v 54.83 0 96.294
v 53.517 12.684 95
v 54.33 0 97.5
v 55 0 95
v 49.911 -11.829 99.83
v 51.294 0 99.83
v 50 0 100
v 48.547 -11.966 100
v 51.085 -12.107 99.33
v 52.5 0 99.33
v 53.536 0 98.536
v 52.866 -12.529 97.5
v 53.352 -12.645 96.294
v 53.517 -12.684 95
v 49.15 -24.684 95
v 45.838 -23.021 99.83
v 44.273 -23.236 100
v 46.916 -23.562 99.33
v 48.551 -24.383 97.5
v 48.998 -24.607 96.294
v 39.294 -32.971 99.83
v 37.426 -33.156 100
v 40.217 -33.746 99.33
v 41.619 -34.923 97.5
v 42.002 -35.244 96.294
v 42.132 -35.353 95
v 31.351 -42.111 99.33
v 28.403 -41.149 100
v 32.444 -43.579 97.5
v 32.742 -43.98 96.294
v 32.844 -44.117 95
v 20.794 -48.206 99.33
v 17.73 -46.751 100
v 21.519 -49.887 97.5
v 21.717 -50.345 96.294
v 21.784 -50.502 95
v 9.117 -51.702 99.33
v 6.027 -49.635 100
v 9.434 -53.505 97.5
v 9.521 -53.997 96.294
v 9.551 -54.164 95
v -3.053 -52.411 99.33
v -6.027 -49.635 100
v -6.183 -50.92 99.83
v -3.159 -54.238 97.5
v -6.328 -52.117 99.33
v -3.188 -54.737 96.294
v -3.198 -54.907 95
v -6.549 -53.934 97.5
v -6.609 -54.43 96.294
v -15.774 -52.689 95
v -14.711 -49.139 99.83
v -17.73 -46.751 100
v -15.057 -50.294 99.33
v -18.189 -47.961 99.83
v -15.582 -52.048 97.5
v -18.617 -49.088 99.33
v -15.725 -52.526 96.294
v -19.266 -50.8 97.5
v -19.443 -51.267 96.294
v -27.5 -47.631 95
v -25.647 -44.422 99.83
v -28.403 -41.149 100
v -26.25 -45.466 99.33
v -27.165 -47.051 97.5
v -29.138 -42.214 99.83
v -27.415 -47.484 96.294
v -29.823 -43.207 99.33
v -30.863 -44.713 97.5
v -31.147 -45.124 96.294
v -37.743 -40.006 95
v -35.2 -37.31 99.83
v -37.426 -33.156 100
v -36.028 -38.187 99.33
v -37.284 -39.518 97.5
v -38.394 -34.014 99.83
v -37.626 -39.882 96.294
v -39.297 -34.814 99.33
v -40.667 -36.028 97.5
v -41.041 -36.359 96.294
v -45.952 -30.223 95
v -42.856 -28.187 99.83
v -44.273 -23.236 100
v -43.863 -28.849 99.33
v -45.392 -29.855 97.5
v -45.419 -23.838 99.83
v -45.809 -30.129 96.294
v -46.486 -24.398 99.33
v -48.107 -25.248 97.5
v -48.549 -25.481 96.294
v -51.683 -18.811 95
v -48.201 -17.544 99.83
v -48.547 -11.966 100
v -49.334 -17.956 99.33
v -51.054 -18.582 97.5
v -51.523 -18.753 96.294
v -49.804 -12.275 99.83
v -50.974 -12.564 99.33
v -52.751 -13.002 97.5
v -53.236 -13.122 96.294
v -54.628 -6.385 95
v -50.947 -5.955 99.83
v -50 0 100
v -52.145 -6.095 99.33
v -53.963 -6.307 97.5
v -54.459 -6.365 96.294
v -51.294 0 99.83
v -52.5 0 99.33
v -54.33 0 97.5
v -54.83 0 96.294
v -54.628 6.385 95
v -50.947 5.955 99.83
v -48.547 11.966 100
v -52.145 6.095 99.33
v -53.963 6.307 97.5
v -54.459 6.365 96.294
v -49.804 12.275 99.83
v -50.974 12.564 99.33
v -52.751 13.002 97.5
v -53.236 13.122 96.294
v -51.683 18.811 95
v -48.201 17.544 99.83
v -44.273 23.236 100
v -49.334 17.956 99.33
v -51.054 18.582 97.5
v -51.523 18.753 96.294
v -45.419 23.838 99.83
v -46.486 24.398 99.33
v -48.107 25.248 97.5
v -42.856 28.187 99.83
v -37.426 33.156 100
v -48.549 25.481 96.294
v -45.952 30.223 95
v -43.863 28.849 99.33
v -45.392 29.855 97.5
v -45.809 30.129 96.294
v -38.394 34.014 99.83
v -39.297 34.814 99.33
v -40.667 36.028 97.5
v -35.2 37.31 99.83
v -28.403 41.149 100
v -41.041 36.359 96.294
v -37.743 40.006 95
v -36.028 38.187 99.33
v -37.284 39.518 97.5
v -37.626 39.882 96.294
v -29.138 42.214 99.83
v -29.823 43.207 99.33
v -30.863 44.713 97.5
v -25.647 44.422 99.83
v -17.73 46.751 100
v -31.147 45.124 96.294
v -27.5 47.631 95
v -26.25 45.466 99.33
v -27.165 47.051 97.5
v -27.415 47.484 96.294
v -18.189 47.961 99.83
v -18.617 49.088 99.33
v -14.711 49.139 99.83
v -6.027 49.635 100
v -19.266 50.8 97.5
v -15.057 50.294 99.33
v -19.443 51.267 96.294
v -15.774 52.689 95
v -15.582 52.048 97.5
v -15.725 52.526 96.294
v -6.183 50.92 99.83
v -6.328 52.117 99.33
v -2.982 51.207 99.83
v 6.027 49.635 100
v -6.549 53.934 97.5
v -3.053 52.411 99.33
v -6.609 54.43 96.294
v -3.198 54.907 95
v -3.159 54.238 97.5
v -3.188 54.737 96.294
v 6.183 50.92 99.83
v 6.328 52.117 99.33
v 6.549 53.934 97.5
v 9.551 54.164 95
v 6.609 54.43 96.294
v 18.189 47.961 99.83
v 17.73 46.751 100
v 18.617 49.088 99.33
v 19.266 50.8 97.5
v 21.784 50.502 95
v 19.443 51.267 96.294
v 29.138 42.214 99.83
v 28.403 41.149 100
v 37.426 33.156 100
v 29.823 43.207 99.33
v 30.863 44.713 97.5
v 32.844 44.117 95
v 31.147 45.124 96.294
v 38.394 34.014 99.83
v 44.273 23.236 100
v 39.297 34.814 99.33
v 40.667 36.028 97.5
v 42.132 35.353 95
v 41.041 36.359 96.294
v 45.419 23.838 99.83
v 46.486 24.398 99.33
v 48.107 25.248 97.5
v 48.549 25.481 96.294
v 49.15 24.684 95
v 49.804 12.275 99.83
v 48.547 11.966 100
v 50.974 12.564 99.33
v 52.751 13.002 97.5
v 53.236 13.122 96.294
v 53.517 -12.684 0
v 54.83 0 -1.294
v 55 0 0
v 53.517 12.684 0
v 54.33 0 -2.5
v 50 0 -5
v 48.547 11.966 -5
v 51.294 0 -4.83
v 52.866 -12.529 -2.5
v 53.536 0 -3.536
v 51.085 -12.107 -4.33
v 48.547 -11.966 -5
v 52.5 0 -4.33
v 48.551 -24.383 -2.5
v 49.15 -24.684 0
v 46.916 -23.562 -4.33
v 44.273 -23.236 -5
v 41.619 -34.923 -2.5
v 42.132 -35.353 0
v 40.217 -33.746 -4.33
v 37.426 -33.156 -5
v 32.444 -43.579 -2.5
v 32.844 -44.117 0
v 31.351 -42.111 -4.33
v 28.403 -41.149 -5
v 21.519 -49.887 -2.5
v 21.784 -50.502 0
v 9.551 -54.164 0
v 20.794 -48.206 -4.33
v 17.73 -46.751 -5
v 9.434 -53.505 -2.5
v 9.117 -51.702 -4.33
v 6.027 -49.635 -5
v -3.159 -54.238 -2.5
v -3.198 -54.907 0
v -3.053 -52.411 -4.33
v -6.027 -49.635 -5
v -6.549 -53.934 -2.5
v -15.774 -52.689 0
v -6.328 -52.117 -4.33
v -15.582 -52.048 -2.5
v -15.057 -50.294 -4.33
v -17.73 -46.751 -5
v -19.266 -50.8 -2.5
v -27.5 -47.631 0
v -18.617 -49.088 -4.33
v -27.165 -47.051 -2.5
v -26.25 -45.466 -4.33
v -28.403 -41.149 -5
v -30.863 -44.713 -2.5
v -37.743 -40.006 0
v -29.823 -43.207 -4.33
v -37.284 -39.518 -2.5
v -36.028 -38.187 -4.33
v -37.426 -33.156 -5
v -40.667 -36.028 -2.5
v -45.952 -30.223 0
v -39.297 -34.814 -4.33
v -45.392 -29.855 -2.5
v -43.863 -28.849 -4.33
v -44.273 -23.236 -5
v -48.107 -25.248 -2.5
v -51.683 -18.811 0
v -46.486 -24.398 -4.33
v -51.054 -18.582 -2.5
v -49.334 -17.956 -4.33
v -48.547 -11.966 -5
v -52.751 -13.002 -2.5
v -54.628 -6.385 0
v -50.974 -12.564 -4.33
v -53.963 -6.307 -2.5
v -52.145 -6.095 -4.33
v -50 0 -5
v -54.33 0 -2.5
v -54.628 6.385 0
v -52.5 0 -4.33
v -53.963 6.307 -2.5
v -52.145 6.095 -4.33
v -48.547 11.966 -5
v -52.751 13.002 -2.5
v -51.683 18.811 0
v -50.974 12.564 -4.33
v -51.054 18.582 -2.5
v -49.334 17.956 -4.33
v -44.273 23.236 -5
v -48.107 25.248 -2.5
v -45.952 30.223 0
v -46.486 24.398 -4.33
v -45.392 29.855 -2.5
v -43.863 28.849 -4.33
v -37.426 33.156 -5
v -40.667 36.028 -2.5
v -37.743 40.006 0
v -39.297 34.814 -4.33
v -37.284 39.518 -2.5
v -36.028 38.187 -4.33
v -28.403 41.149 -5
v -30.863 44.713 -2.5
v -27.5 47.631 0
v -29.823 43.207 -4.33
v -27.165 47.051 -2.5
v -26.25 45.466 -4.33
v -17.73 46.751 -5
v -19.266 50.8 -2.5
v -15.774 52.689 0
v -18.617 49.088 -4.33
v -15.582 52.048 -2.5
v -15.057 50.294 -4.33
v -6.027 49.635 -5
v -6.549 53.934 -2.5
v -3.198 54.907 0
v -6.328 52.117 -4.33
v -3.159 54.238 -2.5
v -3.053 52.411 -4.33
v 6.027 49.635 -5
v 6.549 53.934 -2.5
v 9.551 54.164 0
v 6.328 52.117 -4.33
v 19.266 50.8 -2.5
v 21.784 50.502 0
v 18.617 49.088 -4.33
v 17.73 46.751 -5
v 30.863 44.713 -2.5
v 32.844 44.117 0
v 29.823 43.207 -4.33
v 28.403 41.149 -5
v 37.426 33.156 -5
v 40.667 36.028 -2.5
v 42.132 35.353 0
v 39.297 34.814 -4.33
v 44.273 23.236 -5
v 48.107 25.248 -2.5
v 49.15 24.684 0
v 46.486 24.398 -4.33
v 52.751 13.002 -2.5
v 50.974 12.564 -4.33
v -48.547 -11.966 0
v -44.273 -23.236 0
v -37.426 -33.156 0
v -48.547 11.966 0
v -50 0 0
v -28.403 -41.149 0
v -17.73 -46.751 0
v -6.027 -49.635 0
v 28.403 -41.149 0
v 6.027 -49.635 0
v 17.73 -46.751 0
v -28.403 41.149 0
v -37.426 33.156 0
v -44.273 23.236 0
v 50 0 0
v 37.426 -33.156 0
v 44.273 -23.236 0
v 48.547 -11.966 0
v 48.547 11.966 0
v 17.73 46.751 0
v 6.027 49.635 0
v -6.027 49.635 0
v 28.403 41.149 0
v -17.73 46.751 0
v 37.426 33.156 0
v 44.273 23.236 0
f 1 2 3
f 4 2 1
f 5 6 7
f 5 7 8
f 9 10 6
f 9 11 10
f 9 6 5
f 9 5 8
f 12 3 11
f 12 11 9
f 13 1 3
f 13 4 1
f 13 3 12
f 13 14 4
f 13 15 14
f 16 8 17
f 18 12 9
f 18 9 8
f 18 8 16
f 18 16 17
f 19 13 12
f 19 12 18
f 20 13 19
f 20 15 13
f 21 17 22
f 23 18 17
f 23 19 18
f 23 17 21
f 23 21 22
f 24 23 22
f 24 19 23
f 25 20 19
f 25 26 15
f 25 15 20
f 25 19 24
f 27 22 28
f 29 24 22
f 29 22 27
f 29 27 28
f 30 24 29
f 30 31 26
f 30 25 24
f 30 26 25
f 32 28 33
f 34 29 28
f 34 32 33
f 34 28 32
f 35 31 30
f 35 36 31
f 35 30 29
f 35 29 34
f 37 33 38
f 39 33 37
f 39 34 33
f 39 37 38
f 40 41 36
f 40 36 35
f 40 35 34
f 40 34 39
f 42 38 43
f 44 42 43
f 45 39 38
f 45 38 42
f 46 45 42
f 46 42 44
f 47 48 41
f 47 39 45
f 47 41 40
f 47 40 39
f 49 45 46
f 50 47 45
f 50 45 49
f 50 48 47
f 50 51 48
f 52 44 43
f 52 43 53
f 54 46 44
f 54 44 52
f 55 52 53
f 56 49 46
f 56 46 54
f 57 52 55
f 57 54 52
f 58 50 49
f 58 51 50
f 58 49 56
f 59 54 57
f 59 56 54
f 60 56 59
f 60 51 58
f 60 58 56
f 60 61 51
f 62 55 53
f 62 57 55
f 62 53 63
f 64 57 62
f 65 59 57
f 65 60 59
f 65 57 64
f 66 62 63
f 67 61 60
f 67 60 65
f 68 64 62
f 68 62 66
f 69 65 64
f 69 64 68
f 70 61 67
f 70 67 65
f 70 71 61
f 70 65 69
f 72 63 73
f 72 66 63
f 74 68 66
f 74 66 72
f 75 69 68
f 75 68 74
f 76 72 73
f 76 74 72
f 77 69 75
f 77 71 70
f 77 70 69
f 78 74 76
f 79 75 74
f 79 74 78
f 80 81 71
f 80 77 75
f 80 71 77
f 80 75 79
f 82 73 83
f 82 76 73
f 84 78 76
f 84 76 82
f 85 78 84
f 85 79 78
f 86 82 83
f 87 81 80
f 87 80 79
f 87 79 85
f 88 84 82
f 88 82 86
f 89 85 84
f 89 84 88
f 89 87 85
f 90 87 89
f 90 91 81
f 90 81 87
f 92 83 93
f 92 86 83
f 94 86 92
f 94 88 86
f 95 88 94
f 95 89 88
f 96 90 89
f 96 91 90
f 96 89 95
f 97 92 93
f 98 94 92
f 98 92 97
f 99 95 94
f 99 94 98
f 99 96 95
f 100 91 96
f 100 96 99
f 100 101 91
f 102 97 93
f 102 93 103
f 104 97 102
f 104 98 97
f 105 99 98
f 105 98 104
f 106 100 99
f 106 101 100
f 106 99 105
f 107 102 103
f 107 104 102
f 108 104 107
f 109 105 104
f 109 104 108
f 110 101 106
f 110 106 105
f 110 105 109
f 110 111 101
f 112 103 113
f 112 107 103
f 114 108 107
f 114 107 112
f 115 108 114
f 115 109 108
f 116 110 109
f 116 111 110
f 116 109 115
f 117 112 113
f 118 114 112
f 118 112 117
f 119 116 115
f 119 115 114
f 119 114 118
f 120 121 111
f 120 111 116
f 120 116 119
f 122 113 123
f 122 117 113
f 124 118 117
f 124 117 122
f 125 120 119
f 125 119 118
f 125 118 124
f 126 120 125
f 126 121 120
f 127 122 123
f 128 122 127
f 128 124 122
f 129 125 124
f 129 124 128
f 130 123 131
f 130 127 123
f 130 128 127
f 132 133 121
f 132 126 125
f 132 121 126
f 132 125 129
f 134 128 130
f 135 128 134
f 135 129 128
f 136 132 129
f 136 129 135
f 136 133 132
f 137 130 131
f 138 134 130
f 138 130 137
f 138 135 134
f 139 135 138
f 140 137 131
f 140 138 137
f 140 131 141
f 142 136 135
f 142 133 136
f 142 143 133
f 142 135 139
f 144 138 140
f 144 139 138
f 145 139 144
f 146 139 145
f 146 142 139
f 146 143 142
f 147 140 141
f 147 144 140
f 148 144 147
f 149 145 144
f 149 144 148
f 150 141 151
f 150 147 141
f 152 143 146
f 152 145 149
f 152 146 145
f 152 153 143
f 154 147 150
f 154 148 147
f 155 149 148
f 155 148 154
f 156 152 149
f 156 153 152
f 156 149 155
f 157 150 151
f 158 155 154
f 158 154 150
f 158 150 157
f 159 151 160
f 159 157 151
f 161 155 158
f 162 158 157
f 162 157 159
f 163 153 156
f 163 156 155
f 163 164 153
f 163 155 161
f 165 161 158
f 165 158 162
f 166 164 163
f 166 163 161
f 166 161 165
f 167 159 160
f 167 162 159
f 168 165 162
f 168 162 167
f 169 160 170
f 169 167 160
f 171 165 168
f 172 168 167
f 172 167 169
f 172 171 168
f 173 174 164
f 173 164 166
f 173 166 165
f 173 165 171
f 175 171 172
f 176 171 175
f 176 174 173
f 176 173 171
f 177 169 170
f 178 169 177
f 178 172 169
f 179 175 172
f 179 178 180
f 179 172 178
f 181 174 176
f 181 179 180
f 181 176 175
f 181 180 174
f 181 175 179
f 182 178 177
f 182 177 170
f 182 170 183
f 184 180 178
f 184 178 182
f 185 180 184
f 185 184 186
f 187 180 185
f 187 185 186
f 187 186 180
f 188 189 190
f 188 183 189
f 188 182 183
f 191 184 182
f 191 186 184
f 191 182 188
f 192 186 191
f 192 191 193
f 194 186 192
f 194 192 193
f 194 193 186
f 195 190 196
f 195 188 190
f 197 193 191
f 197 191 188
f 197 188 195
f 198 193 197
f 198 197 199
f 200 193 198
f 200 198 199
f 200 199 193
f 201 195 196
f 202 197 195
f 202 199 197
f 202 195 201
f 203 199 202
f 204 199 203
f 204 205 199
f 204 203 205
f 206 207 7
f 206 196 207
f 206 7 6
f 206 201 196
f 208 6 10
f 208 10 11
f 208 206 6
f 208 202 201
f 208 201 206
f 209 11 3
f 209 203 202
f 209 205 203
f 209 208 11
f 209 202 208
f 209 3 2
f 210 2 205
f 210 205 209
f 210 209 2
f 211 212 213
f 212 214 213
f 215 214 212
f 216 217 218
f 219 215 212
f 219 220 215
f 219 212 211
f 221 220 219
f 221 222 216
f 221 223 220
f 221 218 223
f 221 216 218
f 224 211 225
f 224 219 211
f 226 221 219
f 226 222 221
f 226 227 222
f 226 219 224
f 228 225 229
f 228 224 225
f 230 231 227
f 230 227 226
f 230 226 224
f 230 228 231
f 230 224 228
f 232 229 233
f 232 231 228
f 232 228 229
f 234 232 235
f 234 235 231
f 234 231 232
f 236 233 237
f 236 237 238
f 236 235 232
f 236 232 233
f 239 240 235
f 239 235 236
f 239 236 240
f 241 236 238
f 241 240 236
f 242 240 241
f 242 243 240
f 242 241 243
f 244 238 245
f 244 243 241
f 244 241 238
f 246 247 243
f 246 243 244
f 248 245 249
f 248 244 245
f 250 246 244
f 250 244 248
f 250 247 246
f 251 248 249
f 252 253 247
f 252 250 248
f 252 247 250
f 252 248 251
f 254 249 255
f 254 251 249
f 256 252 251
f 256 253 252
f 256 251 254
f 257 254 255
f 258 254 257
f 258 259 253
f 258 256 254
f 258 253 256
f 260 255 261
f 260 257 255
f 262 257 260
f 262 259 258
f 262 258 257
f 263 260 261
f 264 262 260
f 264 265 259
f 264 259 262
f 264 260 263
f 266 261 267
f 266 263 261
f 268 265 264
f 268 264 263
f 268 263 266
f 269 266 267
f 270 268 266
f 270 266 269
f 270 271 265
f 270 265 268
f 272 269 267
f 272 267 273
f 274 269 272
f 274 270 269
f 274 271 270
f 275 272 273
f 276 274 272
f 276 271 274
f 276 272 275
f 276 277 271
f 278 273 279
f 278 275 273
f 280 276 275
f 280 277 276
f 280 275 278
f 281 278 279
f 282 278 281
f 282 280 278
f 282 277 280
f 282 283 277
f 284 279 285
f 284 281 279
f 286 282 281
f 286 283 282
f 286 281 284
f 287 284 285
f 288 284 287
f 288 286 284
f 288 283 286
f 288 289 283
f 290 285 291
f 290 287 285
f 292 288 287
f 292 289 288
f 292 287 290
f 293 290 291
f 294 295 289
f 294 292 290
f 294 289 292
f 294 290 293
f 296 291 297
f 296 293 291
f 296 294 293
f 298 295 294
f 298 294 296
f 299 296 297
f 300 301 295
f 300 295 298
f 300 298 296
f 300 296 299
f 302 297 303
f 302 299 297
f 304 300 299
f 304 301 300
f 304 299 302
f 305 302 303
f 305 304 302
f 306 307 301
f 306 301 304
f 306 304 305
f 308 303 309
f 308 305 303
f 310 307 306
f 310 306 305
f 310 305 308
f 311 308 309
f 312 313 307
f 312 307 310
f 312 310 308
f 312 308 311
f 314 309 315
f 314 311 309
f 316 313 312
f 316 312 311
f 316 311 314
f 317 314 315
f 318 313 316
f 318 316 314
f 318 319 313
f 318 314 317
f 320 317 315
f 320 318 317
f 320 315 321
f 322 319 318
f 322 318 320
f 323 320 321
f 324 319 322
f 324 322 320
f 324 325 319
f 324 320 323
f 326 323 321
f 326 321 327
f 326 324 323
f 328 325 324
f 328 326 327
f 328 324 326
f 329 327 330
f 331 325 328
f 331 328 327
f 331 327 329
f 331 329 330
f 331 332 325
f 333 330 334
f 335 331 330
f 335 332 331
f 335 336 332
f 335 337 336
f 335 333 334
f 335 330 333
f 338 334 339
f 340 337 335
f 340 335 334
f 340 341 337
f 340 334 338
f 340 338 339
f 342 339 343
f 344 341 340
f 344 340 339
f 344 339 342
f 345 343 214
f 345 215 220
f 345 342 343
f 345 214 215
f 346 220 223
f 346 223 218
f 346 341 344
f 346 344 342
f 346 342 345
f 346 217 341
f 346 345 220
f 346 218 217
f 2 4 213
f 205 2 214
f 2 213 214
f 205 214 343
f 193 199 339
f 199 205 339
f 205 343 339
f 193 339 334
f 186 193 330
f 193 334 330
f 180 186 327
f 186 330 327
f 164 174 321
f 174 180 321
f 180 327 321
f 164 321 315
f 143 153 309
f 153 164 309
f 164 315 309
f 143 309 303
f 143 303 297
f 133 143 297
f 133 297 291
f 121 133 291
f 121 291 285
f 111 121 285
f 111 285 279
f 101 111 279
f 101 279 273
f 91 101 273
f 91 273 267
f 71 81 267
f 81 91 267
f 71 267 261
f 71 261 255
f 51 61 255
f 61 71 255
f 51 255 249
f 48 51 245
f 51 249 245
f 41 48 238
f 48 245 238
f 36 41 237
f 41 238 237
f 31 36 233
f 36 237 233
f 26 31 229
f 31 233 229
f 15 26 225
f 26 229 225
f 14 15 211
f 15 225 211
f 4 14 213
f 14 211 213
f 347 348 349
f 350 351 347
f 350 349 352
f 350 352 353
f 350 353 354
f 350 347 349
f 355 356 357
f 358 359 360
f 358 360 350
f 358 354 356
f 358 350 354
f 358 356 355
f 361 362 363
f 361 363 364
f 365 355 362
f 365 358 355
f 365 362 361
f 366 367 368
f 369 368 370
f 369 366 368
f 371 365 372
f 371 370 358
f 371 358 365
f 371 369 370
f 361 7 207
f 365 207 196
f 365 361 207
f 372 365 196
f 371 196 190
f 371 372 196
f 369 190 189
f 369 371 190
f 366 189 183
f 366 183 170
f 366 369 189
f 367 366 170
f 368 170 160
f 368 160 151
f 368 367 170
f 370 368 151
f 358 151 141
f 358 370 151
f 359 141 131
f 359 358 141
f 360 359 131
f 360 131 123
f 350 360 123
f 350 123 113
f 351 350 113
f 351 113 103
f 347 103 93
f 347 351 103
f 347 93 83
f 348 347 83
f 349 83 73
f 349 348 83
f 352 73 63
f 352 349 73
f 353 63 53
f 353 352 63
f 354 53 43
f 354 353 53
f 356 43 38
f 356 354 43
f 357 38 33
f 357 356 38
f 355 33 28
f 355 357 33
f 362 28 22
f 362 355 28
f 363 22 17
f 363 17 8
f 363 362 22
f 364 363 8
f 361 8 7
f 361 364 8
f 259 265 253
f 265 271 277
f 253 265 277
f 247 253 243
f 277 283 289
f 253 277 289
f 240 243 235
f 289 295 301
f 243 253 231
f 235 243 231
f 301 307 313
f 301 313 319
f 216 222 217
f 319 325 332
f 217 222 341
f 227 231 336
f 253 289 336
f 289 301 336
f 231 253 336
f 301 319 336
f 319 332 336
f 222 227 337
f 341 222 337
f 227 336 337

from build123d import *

# Parameters (mm, degrees)
F0_R     = 50
F1_DEPTH = 100
F2_T     = 5


# Not quite as in the source:
# - a fillet or chamfer that OpenCascade refuses, or shapes differently, is made with other operations: its cross-section is extruded or revolved along the edge and cut away or added
# - a feature of the source that left no trace in its solid (it failed there, or was rolled back) is left out


with BuildPart() as f1:
    # F0 (on Top) → F1 (new body)
    with BuildSketch(Plane.XY):
        Circle(F0_R)
    extrude(amount=F1_DEPTH)

    # F2
    f2_openings = [f1.faces().sort_by_distance(p)[0] for p in [
        (0, 0, 100),
    ]]
    offset(amount=F2_T, openings=f2_openings, kind=Kind.INTERSECTION)

    # F3: fillet of radius 5 on 2 edges, made by hand

    # F3_s1 → F3_t2 (revolve, cut)
    with BuildSketch(Plane.XZ):
        with BuildLine():
            ThreePointArc((50, 100), (53.5355339059, 98.5355339059), (55, 95))
            Line((55, 95), (55, 100))
            Line((55, 100), (50, 100))
        make_face()
    revolve(axis=Axis((0, 0, 100), (0, 0, -1)), mode=Mode.SUBTRACT)

    # F3_s3 → F3_t4 (revolve, cut)
    with BuildSketch(Plane.XZ):
        with BuildLine():
            ThreePointArc((55, 0), (53.5355339059, -3.5355339059), (50, -5))
            Line((50, -5), (55, -5))
            Line((55, -5), (55, 0))
        make_face()
    revolve(axis=Axis((0, 0, -5), (0, 0, -1)), mode=Mode.SUBTRACT)


solid = f1.part
